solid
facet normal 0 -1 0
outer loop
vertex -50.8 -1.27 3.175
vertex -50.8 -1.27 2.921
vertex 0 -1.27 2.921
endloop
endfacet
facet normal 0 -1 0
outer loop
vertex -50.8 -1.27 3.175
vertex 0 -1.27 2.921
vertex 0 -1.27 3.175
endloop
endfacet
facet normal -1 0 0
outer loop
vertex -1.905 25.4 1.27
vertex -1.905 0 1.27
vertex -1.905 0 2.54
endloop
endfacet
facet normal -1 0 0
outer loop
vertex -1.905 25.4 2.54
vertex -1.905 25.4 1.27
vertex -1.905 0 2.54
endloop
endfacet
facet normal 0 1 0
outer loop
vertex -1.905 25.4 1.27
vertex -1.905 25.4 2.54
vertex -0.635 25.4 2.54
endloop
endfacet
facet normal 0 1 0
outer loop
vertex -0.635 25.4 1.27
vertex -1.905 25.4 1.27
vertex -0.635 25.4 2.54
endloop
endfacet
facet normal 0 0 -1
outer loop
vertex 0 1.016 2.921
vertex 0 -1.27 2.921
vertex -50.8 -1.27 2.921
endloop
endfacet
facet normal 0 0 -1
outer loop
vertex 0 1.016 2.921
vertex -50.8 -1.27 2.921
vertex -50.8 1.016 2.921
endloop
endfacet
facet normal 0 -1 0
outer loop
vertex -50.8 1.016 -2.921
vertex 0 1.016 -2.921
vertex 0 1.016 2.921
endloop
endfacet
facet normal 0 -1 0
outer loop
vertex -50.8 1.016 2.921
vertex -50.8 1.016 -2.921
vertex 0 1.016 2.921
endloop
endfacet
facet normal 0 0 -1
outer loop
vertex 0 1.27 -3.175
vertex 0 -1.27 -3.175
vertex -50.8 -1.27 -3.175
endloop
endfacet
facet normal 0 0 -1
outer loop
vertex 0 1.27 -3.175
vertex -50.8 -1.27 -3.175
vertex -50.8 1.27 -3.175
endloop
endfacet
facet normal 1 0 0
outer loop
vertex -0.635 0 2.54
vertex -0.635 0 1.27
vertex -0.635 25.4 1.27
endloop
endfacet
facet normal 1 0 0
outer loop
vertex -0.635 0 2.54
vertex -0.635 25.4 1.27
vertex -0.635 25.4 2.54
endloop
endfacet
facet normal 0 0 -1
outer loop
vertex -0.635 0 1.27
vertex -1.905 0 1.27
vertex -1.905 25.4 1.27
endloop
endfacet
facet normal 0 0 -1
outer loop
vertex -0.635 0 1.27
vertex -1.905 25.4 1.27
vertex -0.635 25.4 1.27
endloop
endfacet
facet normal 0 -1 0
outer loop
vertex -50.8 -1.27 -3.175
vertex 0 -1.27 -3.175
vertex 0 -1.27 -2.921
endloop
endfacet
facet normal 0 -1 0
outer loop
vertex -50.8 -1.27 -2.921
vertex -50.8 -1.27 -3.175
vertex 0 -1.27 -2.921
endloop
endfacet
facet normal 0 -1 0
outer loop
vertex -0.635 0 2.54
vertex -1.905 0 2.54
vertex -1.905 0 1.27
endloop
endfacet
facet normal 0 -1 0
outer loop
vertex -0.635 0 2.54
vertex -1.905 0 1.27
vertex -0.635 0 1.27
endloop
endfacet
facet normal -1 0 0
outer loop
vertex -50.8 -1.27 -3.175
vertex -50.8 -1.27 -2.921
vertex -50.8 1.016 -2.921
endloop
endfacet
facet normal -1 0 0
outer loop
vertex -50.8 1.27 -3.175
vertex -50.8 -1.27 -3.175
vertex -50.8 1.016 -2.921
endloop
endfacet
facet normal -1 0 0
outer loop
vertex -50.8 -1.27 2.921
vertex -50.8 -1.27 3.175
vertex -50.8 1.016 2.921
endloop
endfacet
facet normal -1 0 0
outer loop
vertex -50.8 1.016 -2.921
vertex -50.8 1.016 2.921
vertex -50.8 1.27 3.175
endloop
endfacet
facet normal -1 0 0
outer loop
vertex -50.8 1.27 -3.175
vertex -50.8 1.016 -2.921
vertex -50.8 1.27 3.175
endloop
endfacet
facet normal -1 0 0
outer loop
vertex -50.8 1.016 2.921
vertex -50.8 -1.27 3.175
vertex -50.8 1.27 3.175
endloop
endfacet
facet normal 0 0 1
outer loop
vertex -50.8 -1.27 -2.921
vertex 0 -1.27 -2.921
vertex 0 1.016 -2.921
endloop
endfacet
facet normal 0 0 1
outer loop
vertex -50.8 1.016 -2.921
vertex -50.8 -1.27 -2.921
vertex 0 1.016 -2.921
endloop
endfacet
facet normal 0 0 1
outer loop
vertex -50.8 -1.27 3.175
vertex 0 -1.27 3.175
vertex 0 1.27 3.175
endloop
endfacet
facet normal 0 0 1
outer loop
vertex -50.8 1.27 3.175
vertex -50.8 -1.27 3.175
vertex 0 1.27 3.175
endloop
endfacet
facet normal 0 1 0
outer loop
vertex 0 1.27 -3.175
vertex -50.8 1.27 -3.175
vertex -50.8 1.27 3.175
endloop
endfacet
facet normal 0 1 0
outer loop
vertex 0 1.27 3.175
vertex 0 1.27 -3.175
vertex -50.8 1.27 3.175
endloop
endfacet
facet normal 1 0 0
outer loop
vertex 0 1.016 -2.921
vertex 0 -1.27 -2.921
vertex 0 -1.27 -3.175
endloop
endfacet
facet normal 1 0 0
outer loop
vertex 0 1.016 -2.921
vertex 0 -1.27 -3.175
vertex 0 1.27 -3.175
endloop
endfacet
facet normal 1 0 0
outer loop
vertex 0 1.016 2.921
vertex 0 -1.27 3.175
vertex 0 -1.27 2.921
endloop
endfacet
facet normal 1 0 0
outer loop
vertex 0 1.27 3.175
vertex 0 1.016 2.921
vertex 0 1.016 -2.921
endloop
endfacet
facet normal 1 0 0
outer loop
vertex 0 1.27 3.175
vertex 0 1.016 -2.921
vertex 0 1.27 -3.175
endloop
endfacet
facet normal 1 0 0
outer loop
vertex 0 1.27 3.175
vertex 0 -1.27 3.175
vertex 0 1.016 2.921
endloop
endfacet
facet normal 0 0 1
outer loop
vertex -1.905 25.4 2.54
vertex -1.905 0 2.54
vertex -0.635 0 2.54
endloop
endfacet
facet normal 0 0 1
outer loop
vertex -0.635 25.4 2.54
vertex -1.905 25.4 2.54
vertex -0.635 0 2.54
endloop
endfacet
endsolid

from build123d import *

# Parameters (mm, degrees)
F0_W     = 2.54
F0_H     = 6.35
F1_DEPTH = 50.8
F2_W     = 2.54
F2_H     = 5.842
F3_DEPTH = 76.2
F4_W     = 1.27
F4_H     = 1.27
F5_DEPTH = 25.4


with BuildPart() as f1:
    # F0 (on Right) → F1 (new body)
    with BuildSketch(Plane.YZ):
        Rectangle(F0_W, F0_H)
    extrude(amount=-F1_DEPTH)

    # F2 (on Right) → F3 (cut)
    with BuildSketch(Plane.YZ):
        with Locations((-0.254, 0)):
            Rectangle(F2_W, F2_H)
    extrude(amount=-F3_DEPTH, mode=Mode.SUBTRACT)


with BuildPart() as f5:
    # F4 (on Front) → F5 (new body)
    with BuildSketch(Plane.XZ):
        with Locations((-1.27, 1.905)):
            Rectangle(F4_W, F4_H)
    extrude(amount=-F5_DEPTH)


solid = Compound([f1.part, f5.part])
